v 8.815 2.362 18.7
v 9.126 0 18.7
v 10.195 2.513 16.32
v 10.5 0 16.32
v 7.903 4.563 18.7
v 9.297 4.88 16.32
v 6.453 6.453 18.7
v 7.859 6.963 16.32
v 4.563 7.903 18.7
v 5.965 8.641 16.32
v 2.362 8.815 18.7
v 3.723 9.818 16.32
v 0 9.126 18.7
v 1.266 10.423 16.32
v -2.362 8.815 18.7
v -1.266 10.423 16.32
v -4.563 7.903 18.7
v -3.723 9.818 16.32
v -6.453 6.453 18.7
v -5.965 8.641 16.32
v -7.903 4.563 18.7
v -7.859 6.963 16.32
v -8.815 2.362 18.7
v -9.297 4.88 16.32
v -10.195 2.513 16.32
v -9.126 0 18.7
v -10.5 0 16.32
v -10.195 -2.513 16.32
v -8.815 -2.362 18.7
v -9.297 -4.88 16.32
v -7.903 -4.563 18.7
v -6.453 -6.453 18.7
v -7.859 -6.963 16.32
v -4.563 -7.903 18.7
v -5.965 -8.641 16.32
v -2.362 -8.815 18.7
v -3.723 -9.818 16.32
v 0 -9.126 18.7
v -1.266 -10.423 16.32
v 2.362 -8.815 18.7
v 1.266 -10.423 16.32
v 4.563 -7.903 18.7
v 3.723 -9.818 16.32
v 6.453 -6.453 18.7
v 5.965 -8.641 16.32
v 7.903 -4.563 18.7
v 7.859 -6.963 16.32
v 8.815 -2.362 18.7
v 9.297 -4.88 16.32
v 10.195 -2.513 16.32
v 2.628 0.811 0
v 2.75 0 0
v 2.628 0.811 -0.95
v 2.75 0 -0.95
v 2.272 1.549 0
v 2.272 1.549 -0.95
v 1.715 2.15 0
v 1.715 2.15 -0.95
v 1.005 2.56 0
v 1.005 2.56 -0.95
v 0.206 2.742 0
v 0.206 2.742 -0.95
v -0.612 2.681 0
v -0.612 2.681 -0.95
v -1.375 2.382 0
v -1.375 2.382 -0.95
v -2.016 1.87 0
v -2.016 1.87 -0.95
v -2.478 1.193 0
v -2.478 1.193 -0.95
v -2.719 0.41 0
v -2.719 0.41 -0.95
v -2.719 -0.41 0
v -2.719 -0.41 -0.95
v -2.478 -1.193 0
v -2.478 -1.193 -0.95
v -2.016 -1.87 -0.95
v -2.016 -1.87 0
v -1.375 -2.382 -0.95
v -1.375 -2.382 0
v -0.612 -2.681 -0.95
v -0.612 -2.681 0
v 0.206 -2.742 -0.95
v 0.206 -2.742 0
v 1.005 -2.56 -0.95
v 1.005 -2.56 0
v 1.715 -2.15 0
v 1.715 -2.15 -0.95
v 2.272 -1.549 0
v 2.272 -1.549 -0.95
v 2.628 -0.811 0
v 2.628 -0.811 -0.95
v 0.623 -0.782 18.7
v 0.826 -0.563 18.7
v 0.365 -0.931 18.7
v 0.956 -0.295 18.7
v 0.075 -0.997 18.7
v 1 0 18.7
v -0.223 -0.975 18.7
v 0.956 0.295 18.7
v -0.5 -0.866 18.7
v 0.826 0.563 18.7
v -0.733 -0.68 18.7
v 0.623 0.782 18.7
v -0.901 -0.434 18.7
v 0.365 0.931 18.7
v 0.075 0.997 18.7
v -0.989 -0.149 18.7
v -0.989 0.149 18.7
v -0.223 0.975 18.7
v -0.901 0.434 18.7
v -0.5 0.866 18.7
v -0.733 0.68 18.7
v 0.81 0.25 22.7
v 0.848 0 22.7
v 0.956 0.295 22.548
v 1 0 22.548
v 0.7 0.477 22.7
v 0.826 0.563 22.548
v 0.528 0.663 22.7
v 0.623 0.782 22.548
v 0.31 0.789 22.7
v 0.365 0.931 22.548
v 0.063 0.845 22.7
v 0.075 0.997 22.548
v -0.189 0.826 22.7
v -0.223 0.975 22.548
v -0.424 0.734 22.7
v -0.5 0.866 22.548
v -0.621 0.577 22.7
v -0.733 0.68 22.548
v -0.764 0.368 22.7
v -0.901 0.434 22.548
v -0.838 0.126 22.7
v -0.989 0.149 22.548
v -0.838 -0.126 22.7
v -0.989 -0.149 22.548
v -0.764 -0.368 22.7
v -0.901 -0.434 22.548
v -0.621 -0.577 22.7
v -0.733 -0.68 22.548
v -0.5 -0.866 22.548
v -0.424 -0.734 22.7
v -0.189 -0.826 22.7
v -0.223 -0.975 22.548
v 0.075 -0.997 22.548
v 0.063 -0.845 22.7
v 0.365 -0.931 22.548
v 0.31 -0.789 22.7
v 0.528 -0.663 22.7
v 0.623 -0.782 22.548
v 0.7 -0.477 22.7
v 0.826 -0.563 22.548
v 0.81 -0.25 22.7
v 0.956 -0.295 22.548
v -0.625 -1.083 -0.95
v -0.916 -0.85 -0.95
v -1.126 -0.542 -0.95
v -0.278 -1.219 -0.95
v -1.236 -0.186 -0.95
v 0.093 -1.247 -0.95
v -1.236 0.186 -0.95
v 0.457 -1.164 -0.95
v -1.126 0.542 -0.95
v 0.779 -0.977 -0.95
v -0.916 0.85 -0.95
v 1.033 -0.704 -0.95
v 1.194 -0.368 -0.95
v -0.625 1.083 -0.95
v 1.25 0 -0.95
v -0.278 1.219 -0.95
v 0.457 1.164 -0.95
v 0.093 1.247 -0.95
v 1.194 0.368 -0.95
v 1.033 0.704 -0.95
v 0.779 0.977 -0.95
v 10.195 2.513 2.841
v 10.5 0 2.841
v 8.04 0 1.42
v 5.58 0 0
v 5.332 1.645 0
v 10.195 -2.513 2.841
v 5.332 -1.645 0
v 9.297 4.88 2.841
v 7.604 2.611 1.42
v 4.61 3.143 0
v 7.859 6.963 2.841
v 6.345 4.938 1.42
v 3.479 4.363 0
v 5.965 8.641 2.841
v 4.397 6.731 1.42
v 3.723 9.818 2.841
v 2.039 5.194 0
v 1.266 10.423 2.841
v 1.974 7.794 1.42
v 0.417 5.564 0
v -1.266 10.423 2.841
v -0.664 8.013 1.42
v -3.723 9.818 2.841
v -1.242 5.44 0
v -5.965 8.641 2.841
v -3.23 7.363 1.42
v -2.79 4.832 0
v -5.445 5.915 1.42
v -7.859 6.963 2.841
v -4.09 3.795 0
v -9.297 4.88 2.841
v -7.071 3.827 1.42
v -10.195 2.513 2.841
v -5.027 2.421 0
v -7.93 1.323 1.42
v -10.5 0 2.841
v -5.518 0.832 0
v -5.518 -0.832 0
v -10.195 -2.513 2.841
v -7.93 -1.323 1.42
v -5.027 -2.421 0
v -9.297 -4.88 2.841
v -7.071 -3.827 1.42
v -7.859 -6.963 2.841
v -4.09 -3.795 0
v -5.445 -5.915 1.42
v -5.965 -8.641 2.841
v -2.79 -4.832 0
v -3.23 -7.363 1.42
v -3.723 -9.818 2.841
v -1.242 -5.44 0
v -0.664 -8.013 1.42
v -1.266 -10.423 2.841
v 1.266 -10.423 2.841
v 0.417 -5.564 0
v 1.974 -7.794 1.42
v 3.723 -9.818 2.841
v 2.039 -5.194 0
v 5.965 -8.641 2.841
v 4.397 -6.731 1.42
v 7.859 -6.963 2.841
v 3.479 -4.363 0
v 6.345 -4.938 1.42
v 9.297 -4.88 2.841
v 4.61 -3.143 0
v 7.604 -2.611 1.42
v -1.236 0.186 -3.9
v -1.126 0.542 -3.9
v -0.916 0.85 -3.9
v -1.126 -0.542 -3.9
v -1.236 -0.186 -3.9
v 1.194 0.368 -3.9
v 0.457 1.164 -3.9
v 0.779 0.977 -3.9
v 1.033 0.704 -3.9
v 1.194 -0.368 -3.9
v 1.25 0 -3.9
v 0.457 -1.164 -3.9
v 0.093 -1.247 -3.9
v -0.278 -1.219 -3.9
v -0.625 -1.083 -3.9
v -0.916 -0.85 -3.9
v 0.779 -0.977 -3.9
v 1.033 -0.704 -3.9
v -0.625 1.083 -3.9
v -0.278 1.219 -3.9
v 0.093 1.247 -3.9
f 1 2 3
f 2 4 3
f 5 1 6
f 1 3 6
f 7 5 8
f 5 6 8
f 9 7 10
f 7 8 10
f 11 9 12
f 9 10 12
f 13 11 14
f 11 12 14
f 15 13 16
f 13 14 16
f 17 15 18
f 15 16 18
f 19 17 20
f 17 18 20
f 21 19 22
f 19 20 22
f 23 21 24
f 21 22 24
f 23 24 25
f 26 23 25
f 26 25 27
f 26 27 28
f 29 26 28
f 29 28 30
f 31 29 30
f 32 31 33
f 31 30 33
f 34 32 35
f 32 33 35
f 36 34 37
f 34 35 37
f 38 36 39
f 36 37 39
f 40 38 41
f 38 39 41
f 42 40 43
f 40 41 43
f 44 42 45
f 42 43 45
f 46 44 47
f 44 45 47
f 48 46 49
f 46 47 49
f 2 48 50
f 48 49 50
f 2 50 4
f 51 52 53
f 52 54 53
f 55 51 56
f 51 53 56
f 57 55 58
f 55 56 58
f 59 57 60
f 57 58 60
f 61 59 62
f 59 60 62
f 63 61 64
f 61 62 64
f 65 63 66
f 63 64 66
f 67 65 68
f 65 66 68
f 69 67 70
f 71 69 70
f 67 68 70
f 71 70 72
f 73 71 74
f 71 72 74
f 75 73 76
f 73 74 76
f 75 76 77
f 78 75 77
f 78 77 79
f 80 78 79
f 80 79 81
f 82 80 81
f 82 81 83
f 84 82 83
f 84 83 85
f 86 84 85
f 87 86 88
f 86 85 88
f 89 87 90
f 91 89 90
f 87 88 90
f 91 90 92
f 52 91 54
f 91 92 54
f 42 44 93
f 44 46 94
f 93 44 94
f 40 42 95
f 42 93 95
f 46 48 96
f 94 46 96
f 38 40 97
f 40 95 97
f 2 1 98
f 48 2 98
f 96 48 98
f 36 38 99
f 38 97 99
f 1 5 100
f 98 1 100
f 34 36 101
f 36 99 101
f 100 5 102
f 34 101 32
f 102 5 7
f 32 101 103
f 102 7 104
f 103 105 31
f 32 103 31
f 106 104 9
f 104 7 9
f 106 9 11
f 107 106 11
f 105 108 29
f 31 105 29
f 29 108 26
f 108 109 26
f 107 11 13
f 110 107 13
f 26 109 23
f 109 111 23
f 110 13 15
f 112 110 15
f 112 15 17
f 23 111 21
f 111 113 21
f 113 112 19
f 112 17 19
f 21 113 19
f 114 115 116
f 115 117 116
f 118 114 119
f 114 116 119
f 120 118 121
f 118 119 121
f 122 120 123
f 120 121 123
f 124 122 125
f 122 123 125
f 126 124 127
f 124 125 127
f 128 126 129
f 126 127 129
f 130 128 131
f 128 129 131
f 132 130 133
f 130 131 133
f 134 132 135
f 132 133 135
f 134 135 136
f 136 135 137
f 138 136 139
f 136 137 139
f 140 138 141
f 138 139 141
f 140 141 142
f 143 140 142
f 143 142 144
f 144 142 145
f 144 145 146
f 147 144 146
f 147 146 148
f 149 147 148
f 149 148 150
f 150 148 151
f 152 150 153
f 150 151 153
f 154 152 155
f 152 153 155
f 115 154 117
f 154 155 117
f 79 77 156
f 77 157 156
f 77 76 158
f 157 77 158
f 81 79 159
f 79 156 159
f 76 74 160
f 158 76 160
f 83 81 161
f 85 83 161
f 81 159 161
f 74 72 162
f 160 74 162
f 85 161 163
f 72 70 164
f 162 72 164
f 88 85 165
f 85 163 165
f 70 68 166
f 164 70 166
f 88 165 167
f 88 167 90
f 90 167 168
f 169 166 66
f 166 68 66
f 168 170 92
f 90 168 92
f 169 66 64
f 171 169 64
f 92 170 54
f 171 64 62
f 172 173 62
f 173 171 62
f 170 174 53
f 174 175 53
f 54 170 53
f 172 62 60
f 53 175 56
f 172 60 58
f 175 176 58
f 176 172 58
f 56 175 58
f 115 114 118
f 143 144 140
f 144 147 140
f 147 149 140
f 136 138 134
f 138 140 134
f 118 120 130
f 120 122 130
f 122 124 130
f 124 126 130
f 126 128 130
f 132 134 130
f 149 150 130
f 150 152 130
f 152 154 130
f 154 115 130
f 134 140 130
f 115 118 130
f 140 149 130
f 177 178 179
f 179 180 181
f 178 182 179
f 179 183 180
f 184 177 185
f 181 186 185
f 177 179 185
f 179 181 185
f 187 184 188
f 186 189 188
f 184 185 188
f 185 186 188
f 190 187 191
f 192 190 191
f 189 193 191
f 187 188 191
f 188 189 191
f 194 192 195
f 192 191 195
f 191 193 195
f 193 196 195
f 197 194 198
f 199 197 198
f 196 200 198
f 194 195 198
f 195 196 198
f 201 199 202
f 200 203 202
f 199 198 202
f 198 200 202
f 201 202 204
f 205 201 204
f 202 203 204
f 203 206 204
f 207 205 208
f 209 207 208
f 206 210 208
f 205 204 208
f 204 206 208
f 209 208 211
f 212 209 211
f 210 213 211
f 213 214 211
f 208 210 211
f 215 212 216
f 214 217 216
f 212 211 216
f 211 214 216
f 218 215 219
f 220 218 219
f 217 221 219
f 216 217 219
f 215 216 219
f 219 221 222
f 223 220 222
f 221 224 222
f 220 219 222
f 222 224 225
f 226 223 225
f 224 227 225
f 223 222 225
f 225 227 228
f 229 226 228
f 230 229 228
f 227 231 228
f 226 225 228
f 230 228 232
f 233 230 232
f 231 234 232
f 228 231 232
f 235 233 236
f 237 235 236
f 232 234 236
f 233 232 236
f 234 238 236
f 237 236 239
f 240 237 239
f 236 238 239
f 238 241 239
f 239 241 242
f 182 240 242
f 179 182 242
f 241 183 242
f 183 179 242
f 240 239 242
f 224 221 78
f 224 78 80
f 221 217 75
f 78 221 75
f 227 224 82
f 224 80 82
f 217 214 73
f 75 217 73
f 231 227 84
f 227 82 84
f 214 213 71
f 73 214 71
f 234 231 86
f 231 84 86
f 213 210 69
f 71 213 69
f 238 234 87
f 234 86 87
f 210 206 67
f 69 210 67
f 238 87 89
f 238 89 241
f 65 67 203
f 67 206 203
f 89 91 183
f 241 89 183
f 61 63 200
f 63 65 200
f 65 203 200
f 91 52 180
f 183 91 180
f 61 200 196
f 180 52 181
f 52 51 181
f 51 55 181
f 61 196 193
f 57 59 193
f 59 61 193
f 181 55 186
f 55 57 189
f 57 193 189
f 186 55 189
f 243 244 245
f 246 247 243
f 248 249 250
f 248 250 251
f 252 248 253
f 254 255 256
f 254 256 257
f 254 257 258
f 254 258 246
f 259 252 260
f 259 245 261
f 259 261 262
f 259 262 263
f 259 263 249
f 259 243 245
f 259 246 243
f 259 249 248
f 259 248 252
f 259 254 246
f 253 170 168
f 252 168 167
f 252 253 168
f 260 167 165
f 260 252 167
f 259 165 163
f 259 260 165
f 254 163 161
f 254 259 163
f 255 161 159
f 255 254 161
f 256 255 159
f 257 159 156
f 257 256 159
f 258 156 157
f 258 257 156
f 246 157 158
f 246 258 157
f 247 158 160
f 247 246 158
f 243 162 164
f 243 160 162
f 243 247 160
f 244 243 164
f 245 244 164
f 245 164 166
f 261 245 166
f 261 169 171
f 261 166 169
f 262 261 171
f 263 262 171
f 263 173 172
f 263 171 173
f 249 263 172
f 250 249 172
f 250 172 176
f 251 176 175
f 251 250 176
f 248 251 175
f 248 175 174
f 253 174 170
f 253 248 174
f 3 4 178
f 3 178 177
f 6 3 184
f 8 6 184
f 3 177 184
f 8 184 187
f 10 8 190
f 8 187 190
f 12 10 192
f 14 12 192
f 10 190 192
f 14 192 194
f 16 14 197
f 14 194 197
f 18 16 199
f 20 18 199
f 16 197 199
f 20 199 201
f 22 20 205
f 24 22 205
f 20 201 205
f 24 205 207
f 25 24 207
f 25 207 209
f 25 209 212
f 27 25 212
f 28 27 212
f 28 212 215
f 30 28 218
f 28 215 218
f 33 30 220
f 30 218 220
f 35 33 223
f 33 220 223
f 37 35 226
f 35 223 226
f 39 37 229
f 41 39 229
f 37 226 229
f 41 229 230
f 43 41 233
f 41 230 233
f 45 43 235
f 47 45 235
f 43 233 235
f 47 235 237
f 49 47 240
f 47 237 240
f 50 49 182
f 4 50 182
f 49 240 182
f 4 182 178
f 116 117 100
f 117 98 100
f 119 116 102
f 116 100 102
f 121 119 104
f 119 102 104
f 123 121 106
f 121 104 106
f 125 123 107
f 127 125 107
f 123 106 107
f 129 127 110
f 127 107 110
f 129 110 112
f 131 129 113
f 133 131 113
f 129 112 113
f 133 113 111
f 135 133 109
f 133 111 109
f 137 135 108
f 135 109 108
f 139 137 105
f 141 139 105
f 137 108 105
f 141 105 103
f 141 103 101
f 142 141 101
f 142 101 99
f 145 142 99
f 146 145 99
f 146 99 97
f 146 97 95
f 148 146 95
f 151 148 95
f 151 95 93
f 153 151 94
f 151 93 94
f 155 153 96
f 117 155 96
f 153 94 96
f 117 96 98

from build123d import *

# Parameters (mm, degrees)
BOSS_EXTRUDE1_START = 2
SKETCH2_R           = 1.25
BOSS_EXTRUDE1_DEPTH = 2


with BuildPart() as part:
    # Sketch1 → Revolve1 (revolve)
    with BuildSketch(Plane(origin=(0, 0, 0), x_dir=(1, 0, 0), z_dir=(0, 1, 0))):
        Polygon((1.25, 1.9), (0, 1.9), (0, -22.7), (0.8476, -22.7), (1, -22.5476), (1, -18.7), (9.125906359, -18.7), (10.5, -16.32), (10.5, -2.840563324), (5.58, 0), (2.75, 0), (2.75, 0.95), (1.25, 0.95), align=None)
    revolve(axis=Axis((0, 0, -1.9), (0, 0, 1)))

    # Sketch2 → Boss-Extrude1 (add)
    with BuildSketch(Plane(origin=(0, 0, -1.9), x_dir=(-1, 0, 0), z_dir=(0, 0, -1)).offset(BOSS_EXTRUDE1_START)):
        with Locations(Location((0, 0, 0), (0, 0, 180))):
            Circle(SKETCH2_R)
    extrude(amount=-BOSS_EXTRUDE1_DEPTH)


solid = part.part
